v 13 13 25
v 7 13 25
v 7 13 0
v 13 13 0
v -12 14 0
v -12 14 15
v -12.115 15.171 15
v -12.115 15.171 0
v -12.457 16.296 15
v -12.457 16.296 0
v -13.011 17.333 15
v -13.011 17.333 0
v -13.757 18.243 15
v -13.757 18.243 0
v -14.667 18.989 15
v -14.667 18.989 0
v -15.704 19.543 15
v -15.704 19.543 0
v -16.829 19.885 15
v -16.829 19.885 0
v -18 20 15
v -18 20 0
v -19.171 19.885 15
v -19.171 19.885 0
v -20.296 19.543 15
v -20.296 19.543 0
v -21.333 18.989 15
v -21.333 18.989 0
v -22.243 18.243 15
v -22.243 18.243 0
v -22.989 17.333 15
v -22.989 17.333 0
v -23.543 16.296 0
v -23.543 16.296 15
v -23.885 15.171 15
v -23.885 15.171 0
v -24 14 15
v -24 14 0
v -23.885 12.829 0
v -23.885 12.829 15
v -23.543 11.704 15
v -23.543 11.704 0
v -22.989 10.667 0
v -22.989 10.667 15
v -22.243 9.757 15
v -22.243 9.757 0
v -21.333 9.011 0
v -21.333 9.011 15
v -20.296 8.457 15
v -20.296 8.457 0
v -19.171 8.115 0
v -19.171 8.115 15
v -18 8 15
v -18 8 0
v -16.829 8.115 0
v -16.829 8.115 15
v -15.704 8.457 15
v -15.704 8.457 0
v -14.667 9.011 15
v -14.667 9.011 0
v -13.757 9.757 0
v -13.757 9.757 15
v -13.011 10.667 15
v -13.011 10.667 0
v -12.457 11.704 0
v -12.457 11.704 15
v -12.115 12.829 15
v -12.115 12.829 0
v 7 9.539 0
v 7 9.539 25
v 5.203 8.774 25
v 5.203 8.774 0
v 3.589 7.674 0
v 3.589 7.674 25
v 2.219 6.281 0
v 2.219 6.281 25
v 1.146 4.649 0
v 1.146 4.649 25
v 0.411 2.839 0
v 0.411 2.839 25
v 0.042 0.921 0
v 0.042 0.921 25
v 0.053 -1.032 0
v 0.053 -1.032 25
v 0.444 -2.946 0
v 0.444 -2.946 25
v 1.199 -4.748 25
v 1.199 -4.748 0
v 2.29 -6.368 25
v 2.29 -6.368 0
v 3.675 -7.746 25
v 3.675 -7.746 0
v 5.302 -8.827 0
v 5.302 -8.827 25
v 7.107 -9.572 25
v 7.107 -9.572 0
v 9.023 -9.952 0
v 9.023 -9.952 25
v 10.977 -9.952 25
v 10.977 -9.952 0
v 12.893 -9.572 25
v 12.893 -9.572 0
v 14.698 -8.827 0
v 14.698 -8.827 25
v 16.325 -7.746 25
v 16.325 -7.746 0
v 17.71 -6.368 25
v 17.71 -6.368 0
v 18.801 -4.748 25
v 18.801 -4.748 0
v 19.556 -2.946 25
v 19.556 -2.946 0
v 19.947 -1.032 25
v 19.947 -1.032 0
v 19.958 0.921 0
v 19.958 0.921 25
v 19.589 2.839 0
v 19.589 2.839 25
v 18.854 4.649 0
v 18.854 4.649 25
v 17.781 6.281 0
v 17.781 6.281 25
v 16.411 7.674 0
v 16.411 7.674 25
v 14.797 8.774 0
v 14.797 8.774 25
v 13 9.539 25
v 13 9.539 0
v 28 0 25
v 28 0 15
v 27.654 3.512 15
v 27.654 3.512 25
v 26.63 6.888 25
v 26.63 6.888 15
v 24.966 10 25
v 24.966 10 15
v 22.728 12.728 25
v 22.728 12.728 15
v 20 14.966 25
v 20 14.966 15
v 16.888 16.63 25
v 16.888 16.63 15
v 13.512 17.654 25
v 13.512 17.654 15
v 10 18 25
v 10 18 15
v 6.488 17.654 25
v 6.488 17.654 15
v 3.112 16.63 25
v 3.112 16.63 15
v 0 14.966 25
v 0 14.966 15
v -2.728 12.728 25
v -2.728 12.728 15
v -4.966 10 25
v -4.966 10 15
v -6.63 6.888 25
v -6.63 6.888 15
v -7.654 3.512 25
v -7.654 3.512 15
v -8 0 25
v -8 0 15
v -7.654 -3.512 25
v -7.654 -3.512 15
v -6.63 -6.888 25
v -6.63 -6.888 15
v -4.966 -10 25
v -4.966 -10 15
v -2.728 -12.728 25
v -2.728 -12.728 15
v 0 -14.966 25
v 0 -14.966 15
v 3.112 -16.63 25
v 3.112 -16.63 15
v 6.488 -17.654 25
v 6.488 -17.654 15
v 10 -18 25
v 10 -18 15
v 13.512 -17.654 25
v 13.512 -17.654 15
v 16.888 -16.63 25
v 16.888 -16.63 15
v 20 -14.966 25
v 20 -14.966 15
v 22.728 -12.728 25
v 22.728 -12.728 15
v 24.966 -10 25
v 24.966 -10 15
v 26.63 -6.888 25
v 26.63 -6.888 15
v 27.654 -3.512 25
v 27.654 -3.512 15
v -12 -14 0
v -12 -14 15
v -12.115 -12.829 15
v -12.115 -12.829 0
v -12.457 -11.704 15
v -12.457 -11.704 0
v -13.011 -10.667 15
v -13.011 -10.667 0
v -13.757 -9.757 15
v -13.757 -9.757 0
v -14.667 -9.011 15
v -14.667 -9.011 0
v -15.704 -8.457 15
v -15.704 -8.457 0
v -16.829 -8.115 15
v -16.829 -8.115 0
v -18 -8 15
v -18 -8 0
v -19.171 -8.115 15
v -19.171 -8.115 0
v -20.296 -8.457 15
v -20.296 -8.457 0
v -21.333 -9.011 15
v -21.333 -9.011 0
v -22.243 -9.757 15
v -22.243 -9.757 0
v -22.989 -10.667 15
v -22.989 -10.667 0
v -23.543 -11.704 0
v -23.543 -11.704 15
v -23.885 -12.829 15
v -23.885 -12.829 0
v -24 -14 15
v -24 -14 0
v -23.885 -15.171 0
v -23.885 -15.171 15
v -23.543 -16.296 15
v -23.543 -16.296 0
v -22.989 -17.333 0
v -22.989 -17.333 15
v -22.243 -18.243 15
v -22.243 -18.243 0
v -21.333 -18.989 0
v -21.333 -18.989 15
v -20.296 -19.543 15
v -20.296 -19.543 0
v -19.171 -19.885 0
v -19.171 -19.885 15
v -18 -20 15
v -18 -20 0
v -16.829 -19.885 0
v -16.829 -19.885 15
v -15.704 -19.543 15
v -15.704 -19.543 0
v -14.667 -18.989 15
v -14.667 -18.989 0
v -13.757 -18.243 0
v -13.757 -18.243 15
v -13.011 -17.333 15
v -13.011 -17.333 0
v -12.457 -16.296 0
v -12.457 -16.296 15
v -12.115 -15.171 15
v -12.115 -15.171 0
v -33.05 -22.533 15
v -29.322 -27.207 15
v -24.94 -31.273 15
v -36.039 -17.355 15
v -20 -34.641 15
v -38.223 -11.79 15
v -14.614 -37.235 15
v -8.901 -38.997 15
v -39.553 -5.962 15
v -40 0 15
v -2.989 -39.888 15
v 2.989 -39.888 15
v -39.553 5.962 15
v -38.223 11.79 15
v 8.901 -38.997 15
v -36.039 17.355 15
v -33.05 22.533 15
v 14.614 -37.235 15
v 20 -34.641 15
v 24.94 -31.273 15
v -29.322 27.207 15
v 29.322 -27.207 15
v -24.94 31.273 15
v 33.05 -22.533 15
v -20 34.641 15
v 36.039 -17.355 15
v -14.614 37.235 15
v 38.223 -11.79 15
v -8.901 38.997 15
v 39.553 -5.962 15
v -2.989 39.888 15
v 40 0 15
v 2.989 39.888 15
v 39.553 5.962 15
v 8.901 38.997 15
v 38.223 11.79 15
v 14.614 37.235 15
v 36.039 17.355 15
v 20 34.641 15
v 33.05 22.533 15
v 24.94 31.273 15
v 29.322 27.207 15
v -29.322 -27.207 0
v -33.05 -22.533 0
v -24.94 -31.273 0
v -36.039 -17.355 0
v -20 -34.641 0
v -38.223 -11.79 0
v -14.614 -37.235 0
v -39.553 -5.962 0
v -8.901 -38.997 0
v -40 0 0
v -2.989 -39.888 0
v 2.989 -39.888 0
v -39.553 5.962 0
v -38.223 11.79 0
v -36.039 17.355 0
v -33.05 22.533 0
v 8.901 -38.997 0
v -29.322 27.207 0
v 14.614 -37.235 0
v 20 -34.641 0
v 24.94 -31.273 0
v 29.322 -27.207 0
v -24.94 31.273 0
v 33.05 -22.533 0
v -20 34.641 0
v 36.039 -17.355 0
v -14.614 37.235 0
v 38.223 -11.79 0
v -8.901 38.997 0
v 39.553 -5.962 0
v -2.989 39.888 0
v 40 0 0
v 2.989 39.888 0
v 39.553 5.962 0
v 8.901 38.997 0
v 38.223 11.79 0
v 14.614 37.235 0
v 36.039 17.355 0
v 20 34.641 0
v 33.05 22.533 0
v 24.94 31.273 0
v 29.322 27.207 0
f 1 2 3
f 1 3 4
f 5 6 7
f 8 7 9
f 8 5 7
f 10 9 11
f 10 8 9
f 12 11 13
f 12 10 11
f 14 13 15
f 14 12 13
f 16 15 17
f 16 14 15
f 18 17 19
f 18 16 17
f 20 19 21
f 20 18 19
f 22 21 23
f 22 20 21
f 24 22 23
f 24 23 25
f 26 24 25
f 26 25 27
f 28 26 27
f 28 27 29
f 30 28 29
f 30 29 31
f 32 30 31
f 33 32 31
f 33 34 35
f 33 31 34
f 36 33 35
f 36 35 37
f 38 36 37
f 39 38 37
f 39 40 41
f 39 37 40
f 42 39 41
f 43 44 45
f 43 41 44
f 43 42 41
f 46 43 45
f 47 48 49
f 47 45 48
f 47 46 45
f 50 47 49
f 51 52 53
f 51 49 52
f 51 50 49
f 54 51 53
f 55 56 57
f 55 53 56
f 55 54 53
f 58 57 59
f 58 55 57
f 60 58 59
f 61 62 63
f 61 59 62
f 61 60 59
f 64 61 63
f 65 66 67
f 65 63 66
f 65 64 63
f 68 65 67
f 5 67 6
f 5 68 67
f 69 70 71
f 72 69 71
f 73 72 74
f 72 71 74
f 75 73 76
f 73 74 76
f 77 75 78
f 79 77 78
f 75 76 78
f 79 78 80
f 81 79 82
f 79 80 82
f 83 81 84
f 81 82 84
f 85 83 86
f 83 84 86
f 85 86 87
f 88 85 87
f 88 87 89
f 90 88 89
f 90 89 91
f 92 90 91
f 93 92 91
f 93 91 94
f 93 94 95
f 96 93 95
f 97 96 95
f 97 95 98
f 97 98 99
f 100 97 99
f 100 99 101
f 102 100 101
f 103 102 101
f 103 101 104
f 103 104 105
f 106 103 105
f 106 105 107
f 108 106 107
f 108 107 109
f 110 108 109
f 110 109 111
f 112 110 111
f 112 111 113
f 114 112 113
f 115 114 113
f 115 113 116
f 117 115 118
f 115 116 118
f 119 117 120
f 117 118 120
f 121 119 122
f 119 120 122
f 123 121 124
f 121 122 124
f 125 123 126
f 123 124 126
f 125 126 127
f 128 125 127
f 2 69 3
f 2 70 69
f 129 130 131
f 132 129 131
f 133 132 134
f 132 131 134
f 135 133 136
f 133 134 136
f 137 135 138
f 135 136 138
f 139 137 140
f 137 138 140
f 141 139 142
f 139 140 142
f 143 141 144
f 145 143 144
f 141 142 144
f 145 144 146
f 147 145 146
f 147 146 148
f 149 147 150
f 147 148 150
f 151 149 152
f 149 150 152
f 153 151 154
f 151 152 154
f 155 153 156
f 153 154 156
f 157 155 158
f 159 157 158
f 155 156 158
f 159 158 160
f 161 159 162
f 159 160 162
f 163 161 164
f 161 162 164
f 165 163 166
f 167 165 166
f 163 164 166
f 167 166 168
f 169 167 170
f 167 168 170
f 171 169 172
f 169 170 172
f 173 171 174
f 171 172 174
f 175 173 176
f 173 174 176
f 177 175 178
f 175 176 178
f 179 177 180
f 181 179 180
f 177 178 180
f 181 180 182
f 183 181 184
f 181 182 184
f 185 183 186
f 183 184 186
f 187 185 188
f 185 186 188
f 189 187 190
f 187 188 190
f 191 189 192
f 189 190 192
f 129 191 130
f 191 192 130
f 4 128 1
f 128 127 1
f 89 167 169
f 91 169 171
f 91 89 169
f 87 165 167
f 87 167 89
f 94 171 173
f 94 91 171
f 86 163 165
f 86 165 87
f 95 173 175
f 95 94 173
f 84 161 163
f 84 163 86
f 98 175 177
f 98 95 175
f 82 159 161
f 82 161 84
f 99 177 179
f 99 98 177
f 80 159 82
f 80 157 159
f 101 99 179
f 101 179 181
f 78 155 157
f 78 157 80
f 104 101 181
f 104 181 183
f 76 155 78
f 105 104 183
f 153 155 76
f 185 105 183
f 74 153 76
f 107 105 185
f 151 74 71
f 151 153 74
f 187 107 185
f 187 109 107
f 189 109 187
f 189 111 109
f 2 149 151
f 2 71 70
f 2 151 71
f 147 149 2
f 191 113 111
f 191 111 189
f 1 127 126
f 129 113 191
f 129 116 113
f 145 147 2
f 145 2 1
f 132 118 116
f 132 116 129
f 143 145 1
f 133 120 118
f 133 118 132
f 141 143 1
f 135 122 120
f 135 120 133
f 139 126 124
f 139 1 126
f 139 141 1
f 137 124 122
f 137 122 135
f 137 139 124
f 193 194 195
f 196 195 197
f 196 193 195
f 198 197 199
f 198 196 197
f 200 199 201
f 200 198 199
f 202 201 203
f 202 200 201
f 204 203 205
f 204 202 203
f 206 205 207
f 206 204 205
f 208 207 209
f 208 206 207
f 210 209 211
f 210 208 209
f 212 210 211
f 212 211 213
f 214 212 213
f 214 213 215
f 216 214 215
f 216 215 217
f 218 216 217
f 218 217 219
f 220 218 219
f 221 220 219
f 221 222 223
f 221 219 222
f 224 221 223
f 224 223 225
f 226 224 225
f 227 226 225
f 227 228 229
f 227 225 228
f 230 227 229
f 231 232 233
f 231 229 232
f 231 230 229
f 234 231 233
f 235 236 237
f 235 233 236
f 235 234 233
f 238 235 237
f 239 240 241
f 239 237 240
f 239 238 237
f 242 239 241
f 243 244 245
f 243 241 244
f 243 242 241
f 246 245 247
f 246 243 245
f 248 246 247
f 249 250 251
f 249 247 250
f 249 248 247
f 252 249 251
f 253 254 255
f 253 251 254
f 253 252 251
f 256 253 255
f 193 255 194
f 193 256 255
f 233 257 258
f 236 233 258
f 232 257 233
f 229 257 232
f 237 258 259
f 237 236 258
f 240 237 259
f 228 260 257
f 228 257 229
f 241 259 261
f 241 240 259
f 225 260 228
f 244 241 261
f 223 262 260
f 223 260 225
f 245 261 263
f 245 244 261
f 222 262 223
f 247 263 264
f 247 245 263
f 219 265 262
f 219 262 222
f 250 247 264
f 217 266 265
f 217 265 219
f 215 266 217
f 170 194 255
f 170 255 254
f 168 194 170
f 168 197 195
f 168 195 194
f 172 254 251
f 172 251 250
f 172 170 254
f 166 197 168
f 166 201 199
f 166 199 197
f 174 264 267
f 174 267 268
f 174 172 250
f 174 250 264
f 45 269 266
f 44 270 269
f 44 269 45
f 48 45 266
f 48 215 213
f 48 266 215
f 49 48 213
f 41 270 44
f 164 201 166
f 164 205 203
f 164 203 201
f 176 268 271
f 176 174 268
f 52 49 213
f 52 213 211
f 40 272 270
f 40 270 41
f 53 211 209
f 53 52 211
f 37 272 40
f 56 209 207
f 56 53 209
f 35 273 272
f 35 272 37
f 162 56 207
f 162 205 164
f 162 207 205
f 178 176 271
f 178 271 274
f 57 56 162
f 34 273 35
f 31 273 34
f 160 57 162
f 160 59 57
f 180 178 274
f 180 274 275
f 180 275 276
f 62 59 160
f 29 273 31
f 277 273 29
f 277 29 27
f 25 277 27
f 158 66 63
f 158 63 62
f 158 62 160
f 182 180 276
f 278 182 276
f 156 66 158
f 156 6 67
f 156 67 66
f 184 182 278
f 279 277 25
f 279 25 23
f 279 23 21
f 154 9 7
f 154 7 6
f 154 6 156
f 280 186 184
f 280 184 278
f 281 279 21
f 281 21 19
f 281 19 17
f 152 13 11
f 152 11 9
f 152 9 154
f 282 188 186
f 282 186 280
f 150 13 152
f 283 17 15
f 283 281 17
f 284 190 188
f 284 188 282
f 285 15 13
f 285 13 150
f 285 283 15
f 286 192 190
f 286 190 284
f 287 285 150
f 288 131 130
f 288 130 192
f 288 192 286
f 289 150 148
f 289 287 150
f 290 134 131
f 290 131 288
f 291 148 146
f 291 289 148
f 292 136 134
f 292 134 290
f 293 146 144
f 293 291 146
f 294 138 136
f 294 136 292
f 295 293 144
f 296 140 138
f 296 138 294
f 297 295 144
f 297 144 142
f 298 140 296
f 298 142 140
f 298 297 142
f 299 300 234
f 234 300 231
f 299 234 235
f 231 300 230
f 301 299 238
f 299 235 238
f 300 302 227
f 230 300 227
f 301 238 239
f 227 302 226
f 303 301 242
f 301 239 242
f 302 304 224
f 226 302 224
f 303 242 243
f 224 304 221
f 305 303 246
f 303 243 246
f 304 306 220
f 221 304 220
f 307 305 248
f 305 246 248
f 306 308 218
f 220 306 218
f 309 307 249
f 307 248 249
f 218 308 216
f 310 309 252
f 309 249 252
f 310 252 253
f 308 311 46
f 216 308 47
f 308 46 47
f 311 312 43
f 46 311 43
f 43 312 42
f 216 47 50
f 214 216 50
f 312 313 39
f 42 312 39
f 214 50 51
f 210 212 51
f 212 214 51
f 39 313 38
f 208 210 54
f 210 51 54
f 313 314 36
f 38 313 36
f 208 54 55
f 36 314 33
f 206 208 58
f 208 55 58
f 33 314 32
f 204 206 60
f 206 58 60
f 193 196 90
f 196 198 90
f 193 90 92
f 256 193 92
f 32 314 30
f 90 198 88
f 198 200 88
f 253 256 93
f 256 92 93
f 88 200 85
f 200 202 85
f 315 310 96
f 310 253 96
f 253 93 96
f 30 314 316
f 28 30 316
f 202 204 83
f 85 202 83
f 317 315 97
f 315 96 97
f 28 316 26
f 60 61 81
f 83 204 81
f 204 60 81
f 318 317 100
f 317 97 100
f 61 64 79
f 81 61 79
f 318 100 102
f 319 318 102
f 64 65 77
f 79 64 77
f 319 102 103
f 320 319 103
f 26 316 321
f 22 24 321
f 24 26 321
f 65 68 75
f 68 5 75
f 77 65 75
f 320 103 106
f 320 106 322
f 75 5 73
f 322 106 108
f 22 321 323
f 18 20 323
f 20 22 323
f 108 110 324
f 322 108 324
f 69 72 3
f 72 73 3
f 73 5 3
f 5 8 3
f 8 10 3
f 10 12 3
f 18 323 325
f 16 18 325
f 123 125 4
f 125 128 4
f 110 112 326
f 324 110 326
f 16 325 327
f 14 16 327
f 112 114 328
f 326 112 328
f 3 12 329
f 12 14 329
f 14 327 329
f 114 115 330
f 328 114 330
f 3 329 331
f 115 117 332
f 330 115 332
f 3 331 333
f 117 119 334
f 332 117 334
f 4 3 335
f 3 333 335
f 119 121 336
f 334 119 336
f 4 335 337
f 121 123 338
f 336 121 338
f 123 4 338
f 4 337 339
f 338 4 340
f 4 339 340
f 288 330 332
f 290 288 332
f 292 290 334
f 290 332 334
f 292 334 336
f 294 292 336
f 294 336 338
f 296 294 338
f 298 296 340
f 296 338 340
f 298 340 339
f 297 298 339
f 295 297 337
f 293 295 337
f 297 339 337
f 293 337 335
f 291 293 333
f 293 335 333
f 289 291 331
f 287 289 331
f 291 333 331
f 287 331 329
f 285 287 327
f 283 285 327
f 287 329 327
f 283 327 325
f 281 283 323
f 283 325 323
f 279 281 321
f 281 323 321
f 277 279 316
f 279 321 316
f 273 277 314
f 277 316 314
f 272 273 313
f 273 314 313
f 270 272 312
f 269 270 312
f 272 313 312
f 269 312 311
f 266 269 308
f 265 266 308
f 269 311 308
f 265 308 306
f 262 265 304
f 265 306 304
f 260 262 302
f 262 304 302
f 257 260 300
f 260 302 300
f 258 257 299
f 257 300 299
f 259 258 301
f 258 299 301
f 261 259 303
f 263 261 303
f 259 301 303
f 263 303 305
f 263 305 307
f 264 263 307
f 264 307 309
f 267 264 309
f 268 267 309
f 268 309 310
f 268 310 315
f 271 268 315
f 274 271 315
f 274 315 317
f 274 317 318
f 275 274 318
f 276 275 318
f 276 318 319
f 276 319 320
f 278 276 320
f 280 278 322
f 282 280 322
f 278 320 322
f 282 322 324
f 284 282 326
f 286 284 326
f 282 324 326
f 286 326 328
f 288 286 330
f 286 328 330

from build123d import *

# Parameters (mm, degrees)
SKETCH_1_R          = 40
EXTRUDE_1_DEPTH     = 15
SKETCH_2_R          = 18
EXTRUDE_2_DEPTH     = 10
SKETCH_3_R          = 10
CUT_EXTRUDE_1_DEPTH = 81
SKETCH_4_W          = 6
SKETCH_4_H          = 13
CUT_EXTRUDE_2_DEPTH = 81
SKETCH_5_R          = 6
CUT_EXTRUDE_3_DEPTH = 62.846584384


with BuildPart() as part:
    # 草图1 → 凸台-拉伸1 (new body)
    with BuildSketch(Plane.XY):
        Circle(SKETCH_1_R)
    extrude(amount=EXTRUDE_1_DEPTH)

    # 草图2 → 凸台-拉伸2 (add)
    with BuildSketch(Plane.XY.offset(15)):
        with Locations((10, 0)):
            Circle(SKETCH_2_R)
    extrude(amount=EXTRUDE_2_DEPTH)

    # 草图3 → 切除-拉伸1 (cut, symmetric)
    with BuildSketch(Plane.XY.offset(25)):
        with Locations((10, 0)):
            Circle(SKETCH_3_R)
    extrude(amount=CUT_EXTRUDE_1_DEPTH, both=True, mode=Mode.SUBTRACT)

    # 草图4 → 切除-拉伸2 (cut, symmetric)
    with BuildSketch(Plane.XY.offset(25)):
        with Locations((10, 6.5)):
            Rectangle(SKETCH_4_W, SKETCH_4_H)
    extrude(amount=CUT_EXTRUDE_2_DEPTH, both=True, mode=Mode.SUBTRACT)

    # 草图5 → 切除-拉伸3 (cut, through all)
    with BuildSketch(Plane.XY):
        with Locations((-18, 14)):
            Circle(SKETCH_5_R)
        with Locations((-18, -14)):
            Circle(SKETCH_5_R)
    extrude(amount=CUT_EXTRUDE_3_DEPTH, mode=Mode.SUBTRACT)


solid = part.part
